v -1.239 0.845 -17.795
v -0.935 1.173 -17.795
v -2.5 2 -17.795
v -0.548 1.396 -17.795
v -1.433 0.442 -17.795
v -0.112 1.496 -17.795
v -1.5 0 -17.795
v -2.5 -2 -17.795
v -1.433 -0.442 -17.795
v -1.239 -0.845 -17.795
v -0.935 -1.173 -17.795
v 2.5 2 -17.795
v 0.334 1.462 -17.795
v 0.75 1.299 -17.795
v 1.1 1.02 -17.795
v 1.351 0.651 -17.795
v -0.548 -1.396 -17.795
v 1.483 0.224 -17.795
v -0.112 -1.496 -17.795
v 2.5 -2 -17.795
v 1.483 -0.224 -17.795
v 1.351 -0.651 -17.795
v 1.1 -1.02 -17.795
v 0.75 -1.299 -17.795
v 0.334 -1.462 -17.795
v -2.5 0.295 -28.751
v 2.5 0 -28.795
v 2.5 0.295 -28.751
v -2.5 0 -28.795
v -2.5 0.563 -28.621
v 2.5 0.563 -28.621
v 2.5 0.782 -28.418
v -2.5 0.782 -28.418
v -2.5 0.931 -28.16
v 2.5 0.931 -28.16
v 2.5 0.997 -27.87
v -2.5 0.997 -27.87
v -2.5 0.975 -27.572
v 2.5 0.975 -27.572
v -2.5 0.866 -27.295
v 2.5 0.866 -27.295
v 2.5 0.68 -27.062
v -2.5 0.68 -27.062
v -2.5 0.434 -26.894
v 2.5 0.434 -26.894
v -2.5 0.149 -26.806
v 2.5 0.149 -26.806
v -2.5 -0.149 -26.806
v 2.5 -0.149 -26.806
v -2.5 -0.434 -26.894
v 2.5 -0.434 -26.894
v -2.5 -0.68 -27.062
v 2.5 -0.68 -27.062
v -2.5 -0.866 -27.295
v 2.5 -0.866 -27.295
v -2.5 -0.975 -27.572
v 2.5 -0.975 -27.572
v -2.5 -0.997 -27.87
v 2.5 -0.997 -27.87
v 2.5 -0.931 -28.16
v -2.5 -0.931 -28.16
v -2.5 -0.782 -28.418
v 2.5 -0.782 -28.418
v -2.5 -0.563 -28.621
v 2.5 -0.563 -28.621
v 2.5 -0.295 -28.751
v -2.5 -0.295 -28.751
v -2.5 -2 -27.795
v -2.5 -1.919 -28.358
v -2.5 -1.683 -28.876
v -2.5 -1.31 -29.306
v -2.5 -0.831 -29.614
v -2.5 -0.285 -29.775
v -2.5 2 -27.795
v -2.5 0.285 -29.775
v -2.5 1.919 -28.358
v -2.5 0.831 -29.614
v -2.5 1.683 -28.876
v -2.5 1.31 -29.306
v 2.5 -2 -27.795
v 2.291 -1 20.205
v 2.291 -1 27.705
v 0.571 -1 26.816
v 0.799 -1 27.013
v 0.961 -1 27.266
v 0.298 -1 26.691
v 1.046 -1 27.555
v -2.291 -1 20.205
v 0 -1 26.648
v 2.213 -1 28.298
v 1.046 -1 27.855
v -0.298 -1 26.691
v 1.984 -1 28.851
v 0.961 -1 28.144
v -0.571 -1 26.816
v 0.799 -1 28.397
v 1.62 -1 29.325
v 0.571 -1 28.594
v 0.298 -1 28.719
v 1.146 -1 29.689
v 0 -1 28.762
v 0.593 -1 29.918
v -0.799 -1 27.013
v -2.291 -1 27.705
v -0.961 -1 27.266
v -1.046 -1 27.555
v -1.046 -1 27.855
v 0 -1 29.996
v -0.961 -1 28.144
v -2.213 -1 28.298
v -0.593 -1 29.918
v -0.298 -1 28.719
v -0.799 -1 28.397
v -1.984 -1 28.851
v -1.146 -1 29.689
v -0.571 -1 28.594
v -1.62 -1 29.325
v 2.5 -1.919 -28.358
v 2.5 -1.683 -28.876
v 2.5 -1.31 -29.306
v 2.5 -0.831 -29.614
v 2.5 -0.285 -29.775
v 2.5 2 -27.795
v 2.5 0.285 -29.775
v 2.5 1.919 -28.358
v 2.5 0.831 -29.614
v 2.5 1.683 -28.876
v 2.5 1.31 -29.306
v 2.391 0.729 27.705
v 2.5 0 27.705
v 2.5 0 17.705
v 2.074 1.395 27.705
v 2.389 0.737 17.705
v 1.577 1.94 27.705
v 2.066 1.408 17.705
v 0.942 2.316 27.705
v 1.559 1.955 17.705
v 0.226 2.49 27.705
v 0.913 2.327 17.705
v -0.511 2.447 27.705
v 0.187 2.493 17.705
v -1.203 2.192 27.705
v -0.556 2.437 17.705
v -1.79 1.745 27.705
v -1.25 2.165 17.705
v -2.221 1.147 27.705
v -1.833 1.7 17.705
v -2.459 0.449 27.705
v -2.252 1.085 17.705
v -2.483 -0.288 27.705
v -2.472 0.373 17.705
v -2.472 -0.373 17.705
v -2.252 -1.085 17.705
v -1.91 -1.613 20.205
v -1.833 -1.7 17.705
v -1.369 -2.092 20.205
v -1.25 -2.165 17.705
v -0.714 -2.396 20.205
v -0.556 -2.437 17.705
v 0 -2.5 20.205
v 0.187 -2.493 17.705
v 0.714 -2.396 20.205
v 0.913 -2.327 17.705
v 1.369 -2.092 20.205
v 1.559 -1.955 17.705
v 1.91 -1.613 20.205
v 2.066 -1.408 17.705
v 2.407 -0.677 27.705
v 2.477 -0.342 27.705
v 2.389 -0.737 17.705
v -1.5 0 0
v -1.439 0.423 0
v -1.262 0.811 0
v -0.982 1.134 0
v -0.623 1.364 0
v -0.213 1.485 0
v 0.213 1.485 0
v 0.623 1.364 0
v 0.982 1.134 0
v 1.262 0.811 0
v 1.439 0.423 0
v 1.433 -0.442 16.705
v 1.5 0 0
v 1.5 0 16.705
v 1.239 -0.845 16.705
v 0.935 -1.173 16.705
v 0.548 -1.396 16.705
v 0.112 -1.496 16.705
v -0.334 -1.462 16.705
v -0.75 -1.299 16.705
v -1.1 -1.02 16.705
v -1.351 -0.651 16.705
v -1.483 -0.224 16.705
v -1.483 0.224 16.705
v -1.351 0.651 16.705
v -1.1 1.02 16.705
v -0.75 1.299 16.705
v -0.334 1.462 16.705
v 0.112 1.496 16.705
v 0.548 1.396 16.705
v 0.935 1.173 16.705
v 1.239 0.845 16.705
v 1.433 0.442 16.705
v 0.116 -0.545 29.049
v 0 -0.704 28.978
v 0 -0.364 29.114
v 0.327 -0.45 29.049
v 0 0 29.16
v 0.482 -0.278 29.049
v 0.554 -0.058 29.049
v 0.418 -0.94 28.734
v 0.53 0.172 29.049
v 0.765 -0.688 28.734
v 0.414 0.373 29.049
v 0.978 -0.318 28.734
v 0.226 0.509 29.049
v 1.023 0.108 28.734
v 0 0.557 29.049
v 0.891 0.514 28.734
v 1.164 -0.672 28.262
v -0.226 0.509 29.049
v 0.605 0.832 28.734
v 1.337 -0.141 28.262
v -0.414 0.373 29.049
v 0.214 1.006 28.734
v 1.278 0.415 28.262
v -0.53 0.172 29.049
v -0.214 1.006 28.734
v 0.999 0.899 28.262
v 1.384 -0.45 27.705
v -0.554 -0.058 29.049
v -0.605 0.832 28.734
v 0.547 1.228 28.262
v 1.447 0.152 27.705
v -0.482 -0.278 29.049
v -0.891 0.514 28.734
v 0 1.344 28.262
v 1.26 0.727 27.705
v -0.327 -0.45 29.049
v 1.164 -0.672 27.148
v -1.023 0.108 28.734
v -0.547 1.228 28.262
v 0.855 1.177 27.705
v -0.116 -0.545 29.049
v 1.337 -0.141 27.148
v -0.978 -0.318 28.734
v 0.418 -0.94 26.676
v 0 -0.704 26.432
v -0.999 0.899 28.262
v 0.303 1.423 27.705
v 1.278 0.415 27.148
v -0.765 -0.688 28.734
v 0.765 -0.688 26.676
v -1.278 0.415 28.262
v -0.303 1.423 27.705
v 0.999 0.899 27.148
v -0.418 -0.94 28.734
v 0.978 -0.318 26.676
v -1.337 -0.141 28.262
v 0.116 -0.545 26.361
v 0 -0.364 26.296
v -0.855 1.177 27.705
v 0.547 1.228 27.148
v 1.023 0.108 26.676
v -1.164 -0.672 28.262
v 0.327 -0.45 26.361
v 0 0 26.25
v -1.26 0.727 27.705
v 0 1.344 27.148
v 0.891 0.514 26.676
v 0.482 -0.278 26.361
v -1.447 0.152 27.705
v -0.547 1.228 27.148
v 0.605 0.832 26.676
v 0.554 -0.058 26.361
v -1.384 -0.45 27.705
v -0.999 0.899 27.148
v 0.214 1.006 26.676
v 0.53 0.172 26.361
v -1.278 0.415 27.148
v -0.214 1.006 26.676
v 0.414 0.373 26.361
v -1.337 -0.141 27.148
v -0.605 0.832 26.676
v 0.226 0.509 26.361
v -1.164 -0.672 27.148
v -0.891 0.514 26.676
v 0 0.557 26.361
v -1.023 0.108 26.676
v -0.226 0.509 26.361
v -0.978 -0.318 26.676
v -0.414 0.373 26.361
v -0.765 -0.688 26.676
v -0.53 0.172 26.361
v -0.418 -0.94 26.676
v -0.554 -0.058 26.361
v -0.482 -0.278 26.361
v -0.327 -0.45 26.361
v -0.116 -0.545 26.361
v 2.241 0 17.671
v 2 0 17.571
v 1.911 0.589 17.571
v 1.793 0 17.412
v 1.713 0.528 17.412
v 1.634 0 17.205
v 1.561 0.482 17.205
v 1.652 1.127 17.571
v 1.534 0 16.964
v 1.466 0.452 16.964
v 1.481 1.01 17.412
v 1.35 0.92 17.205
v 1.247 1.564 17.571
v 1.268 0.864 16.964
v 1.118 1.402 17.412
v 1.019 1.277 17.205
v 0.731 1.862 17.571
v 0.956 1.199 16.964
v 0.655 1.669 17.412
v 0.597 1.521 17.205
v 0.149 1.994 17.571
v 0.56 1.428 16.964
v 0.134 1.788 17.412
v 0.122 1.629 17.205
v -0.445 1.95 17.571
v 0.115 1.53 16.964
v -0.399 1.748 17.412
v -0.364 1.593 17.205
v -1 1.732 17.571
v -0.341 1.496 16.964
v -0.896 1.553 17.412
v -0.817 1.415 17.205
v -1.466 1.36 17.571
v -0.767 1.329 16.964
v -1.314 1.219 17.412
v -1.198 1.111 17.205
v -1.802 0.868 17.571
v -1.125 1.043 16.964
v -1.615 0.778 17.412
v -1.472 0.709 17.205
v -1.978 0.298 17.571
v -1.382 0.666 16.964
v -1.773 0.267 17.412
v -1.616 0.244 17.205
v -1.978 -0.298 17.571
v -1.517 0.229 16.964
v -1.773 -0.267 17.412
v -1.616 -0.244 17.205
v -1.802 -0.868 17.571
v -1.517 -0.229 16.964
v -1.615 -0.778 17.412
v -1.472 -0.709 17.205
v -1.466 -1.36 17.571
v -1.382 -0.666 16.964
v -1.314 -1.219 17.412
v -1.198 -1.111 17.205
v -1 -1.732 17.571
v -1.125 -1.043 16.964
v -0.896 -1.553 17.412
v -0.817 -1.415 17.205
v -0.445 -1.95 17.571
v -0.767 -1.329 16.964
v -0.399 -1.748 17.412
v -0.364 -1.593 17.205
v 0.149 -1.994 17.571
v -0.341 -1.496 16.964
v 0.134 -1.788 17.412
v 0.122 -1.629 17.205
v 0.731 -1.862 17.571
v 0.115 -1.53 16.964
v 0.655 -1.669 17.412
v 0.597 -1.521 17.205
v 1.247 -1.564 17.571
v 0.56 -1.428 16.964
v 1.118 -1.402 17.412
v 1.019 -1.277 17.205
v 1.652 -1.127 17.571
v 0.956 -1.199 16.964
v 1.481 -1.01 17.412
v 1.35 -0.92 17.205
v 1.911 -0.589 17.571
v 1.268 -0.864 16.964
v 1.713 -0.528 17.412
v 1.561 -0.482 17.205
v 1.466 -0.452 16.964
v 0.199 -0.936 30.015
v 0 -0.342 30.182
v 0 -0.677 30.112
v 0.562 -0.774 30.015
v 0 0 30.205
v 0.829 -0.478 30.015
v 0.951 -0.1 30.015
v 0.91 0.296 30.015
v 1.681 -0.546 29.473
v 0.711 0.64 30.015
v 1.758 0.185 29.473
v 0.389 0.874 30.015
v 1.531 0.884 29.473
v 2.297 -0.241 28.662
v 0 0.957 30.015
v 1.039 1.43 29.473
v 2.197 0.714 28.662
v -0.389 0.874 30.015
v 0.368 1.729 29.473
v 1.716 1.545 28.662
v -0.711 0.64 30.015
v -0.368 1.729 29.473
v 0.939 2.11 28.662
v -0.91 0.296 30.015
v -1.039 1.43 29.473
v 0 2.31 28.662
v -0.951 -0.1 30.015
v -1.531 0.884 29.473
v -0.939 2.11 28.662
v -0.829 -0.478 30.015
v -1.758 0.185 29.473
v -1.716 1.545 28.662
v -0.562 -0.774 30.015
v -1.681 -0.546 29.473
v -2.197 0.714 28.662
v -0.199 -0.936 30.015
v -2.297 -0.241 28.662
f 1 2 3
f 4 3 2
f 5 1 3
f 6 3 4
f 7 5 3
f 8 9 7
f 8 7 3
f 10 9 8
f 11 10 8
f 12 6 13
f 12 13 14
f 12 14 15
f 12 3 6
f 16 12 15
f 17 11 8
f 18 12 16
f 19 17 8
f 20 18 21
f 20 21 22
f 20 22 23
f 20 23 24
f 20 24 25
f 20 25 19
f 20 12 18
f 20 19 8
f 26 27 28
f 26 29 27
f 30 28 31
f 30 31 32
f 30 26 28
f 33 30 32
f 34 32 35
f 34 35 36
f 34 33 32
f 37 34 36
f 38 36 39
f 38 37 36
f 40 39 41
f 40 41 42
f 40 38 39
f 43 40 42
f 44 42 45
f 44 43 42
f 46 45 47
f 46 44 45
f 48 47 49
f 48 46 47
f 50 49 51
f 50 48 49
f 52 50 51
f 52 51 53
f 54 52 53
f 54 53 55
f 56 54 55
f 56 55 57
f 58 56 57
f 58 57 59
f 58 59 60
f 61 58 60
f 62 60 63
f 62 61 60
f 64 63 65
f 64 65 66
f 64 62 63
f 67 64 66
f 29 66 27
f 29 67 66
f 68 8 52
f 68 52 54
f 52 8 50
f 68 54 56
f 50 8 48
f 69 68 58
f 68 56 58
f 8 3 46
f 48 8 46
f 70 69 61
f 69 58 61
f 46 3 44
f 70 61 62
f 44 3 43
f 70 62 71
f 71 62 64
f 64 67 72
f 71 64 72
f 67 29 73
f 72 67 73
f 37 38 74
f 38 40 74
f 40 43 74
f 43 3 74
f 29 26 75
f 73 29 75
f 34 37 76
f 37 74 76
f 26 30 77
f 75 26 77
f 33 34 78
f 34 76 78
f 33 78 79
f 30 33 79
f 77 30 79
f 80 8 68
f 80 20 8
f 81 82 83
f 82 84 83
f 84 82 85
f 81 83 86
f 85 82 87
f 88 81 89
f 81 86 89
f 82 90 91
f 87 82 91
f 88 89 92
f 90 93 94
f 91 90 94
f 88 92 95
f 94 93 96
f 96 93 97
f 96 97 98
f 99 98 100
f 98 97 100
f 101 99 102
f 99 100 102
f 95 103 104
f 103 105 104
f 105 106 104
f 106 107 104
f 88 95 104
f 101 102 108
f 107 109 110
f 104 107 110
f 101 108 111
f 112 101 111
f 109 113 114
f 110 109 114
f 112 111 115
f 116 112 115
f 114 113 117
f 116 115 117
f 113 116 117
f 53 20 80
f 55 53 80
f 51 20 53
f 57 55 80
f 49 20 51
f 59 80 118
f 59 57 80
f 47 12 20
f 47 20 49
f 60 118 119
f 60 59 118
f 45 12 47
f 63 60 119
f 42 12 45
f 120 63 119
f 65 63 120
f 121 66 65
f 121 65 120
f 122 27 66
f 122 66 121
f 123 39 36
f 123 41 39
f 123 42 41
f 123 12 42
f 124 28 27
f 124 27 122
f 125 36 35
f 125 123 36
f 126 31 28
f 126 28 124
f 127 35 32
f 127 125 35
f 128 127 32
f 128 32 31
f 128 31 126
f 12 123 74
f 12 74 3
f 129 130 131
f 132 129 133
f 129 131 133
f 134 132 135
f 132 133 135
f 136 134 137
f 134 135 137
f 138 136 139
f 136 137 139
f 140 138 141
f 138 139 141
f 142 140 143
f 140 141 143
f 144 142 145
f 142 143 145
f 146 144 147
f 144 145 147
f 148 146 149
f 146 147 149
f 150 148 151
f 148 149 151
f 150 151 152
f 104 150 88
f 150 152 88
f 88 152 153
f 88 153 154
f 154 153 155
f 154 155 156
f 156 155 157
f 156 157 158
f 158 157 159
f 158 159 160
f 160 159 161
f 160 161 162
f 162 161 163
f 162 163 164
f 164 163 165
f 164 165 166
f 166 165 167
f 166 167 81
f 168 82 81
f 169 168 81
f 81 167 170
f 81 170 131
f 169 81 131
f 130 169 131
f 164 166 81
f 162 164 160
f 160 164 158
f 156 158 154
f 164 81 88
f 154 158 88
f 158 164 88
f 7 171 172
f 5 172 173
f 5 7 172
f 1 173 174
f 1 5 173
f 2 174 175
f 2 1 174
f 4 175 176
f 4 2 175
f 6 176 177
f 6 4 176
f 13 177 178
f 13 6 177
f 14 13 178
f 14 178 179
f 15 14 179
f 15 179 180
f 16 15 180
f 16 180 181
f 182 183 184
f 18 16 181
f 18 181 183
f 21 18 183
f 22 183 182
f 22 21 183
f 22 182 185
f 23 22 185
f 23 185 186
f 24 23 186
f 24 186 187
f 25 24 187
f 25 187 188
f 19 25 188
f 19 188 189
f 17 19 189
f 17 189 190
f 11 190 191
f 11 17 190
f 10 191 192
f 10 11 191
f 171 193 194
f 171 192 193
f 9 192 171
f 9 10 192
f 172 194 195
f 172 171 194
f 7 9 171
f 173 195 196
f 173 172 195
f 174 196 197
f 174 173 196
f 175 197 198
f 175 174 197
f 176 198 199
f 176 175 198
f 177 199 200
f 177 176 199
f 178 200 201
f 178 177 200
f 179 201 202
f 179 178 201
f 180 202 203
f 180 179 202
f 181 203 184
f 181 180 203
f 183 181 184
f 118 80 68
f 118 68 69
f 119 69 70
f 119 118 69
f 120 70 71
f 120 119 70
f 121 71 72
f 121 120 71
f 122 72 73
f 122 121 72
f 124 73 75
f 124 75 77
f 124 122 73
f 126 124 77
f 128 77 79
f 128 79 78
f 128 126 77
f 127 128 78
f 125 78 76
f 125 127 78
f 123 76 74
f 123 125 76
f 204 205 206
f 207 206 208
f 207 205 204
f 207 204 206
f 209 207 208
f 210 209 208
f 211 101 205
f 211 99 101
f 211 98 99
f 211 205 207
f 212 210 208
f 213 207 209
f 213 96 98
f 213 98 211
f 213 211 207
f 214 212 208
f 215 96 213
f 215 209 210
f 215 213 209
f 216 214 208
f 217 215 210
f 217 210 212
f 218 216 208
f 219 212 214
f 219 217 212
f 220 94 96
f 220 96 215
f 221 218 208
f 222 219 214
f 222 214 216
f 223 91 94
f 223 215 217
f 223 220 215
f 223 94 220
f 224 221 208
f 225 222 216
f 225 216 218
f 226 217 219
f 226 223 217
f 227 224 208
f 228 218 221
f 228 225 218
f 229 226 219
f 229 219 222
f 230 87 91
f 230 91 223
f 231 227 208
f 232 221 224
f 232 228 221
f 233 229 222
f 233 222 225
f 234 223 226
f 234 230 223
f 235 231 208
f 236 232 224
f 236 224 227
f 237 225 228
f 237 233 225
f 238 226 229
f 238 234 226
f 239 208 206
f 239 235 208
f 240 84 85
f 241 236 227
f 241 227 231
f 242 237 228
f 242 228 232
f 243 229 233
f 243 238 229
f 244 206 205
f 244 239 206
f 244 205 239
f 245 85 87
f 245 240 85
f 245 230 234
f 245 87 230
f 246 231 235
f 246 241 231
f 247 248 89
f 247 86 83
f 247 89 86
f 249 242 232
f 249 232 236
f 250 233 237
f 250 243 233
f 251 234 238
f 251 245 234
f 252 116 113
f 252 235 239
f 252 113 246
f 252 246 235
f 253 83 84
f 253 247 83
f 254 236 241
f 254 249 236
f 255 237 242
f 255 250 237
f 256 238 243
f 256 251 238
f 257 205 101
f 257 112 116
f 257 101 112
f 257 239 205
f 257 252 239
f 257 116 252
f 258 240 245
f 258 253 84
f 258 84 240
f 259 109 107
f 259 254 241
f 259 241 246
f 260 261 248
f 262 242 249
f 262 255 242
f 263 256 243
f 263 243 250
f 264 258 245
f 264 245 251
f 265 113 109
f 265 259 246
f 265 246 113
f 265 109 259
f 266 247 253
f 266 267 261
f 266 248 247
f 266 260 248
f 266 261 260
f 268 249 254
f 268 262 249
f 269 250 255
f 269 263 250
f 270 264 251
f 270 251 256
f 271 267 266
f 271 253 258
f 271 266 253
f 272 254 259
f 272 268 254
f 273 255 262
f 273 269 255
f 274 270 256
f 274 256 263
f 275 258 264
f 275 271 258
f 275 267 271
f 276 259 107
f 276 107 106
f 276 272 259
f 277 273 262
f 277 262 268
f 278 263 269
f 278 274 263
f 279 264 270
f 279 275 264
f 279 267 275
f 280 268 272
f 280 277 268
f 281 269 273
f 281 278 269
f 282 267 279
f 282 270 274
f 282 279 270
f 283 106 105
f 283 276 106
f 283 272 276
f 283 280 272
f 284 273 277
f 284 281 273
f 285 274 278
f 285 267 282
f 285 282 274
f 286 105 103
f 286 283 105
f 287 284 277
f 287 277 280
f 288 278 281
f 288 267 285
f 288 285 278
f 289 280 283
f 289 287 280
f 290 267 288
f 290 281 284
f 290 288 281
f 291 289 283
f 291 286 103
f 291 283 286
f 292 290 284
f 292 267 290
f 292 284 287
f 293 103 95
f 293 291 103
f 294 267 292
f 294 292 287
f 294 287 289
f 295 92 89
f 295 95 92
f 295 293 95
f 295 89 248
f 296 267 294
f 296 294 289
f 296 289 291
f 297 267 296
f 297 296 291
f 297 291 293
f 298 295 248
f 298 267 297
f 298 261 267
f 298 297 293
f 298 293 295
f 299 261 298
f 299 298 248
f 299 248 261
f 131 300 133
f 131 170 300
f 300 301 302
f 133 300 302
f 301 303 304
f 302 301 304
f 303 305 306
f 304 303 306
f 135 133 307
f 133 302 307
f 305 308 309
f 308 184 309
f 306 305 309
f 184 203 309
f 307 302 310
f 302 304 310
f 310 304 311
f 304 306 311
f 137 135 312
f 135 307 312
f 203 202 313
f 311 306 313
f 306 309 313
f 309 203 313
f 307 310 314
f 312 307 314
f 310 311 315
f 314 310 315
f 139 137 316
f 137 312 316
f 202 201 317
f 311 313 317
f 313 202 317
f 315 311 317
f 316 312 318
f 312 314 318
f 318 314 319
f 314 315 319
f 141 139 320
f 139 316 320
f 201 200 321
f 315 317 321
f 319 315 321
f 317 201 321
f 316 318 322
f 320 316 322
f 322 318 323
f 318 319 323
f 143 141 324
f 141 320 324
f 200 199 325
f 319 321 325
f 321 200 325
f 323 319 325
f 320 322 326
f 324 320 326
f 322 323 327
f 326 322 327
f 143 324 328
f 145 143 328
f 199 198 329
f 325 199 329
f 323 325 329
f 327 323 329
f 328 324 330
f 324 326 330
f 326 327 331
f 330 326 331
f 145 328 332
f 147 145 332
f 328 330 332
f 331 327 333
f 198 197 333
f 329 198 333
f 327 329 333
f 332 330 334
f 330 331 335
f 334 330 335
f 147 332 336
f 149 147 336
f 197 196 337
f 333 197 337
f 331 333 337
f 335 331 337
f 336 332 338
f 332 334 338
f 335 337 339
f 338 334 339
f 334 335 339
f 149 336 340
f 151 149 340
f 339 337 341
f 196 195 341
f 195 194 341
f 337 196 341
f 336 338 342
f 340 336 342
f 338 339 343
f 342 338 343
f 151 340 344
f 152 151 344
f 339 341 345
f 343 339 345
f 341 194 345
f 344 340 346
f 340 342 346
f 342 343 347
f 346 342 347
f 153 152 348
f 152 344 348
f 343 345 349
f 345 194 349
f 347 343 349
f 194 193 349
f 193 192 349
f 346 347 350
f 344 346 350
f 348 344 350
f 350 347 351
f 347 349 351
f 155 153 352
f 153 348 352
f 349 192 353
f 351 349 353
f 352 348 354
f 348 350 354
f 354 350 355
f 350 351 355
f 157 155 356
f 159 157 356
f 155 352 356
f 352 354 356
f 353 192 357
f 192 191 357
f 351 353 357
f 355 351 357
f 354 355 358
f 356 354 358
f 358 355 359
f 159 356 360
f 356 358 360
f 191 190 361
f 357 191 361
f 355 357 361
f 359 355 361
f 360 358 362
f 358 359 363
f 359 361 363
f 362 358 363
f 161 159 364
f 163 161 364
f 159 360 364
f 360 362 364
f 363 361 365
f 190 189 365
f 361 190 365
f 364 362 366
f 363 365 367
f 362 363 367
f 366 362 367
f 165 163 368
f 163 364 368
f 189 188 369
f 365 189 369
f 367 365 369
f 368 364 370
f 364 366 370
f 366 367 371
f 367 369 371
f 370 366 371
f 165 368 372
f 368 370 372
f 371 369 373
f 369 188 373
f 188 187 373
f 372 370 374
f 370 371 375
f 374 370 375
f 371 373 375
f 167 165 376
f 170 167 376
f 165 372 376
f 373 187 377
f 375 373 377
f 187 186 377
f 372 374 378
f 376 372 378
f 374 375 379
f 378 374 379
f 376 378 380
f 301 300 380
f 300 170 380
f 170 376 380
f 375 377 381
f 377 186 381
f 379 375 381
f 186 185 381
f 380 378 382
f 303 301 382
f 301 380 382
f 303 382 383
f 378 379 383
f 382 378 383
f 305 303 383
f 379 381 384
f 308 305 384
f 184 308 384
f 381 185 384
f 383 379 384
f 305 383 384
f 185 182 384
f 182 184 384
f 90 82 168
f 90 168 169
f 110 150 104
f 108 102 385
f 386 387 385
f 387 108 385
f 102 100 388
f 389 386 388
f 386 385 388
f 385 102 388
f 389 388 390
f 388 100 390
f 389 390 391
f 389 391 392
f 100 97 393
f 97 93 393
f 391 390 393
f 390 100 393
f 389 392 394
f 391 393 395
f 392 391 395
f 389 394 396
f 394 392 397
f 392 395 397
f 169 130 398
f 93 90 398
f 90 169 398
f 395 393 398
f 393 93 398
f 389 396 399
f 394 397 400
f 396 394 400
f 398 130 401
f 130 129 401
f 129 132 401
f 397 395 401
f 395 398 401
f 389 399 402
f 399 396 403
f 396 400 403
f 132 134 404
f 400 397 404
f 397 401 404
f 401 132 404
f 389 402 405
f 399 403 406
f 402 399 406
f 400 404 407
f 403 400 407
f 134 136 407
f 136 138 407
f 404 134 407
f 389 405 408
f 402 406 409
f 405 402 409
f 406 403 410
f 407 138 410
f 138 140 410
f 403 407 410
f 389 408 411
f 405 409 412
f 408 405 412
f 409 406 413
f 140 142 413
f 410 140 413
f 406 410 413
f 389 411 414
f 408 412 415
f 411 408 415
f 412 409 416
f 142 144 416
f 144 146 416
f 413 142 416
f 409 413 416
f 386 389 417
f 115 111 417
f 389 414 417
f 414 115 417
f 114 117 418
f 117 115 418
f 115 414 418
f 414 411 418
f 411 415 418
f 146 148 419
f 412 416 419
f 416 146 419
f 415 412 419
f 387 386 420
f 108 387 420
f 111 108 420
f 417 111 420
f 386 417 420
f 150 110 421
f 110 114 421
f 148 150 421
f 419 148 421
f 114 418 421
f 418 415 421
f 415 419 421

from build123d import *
from build123d.topology import SkipClean

# Parameters (mm, degrees)
SKETCH_1_R          = 1.5
EXTRUDE_1_DEPTH     = 17.705
SKETCH_2_R          = 2.5
EXTRUDE_2_DEPTH     = 10
FILLET_1_R          = 1
CUT_EXTRUDE_1_DEPTH = 10
EXTRUDE_START       = 17.795
SKETCH_6_R          = 1.5
EXTRUDE_3_DEPTH     = 17.795
SKETCH_7_R          = 1
EXTRUDE_4_DEPTH     = 2.5


with BuildPart() as part:
    # 草图1 → 凸台-拉伸1 (new body)
    with BuildSketch(Plane.XY):
        Circle(SKETCH_1_R)
    extrude(amount=EXTRUDE_1_DEPTH)

    # 草图2 → 凸台-拉伸2 (add)
    with BuildSketch(Plane.XY.offset(17.705)):
        Circle(SKETCH_2_R)
    extrude(amount=EXTRUDE_2_DEPTH)

    # 圆角1
    fillet_1_edges = [part.edges().sort_by_distance(p)[0] for p in [
        (-1.5, 0, 17.705),
    ]]
    fillet(fillet_1_edges, radius=FILLET_1_R - 0.0001)  # a hair under: the kernel refuses the full size

    # 草图3 → 旋转1 (revolve)
    with SkipClean():  # the faces are left unmerged after this step: merging them gives an invalid solid
        with BuildSketch(Plane(origin=(0, 0, 0), x_dir=(0, 0, -1), z_dir=(1, 0, 0))):
            with BuildLine():
                ThreePointArc((-30.205, 0), (-27.705, -2.5), (-25.205, 0))
                Line((-25.205, 0), (-27.705, 0))
                Line((-27.705, 0), (-30.205, 0))
            make_face()
            with BuildLine():
                Line((-27.705, 0), (-25.205, 0))
                ThreePointArc((-25.205, 0), (-27.705, 2.5), (-30.205, 0))
                Line((-30.205, 0), (-27.705, 0))
            make_face()
        revolve(axis=Axis((0, 0, 0), (0, 0, 1)))
    add(part.part.scale(1), mode=Mode.REPLACE)  # the faces are merged on a copy

    # 草图4 → 切除-拉伸1 (cut)
    with BuildSketch(Plane.XY.offset(30.205)):
        Polygon((-2.5, -1), (0, -1), (2.5, -1), (2.5, -3), (-2.5, -3), align=None)
    extrude(amount=-CUT_EXTRUDE_1_DEPTH, mode=Mode.SUBTRACT)

    # 草图5 → 切除-旋转11 (revolve, cut)
    with BuildSketch(Plane(origin=(0, 0, 0), x_dir=(0, 0, -1), z_dir=(1, 0, 0))):
        with BuildLine():
            Line((-26.25, 0), (-29.16, 0))
            ThreePointArc((-29.16, 0), (-27.705, -1.455), (-26.25, 0))
        make_face()
    revolve(axis=Axis((0, 0, 0), (0, 0, 1)), mode=Mode.SUBTRACT)

    # 草图6 → 凸台-拉伸3 (add)
    with SkipClean():  # the faces are left unmerged after this step: merging them gives an invalid solid
        with BuildSketch(Plane(origin=(0, 0, 0), x_dir=(-1, 0, 0), z_dir=(0, 0, -1)).offset(EXTRUDE_START)):
            Circle(SKETCH_6_R)
        extrude(amount=-EXTRUDE_3_DEPTH)

    # 草图7 → 凸台-拉伸4 (add, symmetric)
    with BuildSketch(Plane(origin=(0, 0, 0), x_dir=(0, 0, -1), z_dir=(1, 0, 0))):
        with BuildLine():
            Line((17.795, -2), (27.795, -2))
            ThreePointArc((27.795, -2), (29.795, 0), (27.795, 2))
            Line((27.795, 2), (17.795, 2))
            Line((17.795, 2), (17.795, -2))
        make_face()
        with Locations((27.795, 0)):
            Circle(SKETCH_7_R, mode=Mode.SUBTRACT)
    extrude(amount=EXTRUDE_4_DEPTH, both=True)


solid = part.part
